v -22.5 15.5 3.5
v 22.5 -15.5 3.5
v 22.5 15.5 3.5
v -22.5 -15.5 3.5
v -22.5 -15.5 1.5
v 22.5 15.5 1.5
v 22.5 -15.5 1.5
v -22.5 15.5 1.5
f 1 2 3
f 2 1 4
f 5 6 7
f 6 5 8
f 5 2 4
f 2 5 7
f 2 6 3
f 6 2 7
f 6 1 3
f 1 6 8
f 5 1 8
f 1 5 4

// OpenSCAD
module neg()
{
translate([29,0,0])cube([20,35,20], center=true);
translate([20,-30,0])cube([50,60,20], center=true);
translate([-5,-10,0])cylinder(r = 10, h=20,center=true);
}

module logo_05()
{
linear_extrude (height=5) import ("python05.dxf");

}

module logo()
{
linear_extrude (height=5) import ("python.dxf");
translate([0,0, 1])cube([45,31,2], center=true);
}

// translate([100,0,0])logo();

module dual_small()
{
	translate([5,0,0])rotate([0,0,180])logo_05();
}

module dual_big()
{
	logo_05();	
	translate([0,0, 2.5])cube([45,31,2], center=true);
}

dual_big();
dual_small();
